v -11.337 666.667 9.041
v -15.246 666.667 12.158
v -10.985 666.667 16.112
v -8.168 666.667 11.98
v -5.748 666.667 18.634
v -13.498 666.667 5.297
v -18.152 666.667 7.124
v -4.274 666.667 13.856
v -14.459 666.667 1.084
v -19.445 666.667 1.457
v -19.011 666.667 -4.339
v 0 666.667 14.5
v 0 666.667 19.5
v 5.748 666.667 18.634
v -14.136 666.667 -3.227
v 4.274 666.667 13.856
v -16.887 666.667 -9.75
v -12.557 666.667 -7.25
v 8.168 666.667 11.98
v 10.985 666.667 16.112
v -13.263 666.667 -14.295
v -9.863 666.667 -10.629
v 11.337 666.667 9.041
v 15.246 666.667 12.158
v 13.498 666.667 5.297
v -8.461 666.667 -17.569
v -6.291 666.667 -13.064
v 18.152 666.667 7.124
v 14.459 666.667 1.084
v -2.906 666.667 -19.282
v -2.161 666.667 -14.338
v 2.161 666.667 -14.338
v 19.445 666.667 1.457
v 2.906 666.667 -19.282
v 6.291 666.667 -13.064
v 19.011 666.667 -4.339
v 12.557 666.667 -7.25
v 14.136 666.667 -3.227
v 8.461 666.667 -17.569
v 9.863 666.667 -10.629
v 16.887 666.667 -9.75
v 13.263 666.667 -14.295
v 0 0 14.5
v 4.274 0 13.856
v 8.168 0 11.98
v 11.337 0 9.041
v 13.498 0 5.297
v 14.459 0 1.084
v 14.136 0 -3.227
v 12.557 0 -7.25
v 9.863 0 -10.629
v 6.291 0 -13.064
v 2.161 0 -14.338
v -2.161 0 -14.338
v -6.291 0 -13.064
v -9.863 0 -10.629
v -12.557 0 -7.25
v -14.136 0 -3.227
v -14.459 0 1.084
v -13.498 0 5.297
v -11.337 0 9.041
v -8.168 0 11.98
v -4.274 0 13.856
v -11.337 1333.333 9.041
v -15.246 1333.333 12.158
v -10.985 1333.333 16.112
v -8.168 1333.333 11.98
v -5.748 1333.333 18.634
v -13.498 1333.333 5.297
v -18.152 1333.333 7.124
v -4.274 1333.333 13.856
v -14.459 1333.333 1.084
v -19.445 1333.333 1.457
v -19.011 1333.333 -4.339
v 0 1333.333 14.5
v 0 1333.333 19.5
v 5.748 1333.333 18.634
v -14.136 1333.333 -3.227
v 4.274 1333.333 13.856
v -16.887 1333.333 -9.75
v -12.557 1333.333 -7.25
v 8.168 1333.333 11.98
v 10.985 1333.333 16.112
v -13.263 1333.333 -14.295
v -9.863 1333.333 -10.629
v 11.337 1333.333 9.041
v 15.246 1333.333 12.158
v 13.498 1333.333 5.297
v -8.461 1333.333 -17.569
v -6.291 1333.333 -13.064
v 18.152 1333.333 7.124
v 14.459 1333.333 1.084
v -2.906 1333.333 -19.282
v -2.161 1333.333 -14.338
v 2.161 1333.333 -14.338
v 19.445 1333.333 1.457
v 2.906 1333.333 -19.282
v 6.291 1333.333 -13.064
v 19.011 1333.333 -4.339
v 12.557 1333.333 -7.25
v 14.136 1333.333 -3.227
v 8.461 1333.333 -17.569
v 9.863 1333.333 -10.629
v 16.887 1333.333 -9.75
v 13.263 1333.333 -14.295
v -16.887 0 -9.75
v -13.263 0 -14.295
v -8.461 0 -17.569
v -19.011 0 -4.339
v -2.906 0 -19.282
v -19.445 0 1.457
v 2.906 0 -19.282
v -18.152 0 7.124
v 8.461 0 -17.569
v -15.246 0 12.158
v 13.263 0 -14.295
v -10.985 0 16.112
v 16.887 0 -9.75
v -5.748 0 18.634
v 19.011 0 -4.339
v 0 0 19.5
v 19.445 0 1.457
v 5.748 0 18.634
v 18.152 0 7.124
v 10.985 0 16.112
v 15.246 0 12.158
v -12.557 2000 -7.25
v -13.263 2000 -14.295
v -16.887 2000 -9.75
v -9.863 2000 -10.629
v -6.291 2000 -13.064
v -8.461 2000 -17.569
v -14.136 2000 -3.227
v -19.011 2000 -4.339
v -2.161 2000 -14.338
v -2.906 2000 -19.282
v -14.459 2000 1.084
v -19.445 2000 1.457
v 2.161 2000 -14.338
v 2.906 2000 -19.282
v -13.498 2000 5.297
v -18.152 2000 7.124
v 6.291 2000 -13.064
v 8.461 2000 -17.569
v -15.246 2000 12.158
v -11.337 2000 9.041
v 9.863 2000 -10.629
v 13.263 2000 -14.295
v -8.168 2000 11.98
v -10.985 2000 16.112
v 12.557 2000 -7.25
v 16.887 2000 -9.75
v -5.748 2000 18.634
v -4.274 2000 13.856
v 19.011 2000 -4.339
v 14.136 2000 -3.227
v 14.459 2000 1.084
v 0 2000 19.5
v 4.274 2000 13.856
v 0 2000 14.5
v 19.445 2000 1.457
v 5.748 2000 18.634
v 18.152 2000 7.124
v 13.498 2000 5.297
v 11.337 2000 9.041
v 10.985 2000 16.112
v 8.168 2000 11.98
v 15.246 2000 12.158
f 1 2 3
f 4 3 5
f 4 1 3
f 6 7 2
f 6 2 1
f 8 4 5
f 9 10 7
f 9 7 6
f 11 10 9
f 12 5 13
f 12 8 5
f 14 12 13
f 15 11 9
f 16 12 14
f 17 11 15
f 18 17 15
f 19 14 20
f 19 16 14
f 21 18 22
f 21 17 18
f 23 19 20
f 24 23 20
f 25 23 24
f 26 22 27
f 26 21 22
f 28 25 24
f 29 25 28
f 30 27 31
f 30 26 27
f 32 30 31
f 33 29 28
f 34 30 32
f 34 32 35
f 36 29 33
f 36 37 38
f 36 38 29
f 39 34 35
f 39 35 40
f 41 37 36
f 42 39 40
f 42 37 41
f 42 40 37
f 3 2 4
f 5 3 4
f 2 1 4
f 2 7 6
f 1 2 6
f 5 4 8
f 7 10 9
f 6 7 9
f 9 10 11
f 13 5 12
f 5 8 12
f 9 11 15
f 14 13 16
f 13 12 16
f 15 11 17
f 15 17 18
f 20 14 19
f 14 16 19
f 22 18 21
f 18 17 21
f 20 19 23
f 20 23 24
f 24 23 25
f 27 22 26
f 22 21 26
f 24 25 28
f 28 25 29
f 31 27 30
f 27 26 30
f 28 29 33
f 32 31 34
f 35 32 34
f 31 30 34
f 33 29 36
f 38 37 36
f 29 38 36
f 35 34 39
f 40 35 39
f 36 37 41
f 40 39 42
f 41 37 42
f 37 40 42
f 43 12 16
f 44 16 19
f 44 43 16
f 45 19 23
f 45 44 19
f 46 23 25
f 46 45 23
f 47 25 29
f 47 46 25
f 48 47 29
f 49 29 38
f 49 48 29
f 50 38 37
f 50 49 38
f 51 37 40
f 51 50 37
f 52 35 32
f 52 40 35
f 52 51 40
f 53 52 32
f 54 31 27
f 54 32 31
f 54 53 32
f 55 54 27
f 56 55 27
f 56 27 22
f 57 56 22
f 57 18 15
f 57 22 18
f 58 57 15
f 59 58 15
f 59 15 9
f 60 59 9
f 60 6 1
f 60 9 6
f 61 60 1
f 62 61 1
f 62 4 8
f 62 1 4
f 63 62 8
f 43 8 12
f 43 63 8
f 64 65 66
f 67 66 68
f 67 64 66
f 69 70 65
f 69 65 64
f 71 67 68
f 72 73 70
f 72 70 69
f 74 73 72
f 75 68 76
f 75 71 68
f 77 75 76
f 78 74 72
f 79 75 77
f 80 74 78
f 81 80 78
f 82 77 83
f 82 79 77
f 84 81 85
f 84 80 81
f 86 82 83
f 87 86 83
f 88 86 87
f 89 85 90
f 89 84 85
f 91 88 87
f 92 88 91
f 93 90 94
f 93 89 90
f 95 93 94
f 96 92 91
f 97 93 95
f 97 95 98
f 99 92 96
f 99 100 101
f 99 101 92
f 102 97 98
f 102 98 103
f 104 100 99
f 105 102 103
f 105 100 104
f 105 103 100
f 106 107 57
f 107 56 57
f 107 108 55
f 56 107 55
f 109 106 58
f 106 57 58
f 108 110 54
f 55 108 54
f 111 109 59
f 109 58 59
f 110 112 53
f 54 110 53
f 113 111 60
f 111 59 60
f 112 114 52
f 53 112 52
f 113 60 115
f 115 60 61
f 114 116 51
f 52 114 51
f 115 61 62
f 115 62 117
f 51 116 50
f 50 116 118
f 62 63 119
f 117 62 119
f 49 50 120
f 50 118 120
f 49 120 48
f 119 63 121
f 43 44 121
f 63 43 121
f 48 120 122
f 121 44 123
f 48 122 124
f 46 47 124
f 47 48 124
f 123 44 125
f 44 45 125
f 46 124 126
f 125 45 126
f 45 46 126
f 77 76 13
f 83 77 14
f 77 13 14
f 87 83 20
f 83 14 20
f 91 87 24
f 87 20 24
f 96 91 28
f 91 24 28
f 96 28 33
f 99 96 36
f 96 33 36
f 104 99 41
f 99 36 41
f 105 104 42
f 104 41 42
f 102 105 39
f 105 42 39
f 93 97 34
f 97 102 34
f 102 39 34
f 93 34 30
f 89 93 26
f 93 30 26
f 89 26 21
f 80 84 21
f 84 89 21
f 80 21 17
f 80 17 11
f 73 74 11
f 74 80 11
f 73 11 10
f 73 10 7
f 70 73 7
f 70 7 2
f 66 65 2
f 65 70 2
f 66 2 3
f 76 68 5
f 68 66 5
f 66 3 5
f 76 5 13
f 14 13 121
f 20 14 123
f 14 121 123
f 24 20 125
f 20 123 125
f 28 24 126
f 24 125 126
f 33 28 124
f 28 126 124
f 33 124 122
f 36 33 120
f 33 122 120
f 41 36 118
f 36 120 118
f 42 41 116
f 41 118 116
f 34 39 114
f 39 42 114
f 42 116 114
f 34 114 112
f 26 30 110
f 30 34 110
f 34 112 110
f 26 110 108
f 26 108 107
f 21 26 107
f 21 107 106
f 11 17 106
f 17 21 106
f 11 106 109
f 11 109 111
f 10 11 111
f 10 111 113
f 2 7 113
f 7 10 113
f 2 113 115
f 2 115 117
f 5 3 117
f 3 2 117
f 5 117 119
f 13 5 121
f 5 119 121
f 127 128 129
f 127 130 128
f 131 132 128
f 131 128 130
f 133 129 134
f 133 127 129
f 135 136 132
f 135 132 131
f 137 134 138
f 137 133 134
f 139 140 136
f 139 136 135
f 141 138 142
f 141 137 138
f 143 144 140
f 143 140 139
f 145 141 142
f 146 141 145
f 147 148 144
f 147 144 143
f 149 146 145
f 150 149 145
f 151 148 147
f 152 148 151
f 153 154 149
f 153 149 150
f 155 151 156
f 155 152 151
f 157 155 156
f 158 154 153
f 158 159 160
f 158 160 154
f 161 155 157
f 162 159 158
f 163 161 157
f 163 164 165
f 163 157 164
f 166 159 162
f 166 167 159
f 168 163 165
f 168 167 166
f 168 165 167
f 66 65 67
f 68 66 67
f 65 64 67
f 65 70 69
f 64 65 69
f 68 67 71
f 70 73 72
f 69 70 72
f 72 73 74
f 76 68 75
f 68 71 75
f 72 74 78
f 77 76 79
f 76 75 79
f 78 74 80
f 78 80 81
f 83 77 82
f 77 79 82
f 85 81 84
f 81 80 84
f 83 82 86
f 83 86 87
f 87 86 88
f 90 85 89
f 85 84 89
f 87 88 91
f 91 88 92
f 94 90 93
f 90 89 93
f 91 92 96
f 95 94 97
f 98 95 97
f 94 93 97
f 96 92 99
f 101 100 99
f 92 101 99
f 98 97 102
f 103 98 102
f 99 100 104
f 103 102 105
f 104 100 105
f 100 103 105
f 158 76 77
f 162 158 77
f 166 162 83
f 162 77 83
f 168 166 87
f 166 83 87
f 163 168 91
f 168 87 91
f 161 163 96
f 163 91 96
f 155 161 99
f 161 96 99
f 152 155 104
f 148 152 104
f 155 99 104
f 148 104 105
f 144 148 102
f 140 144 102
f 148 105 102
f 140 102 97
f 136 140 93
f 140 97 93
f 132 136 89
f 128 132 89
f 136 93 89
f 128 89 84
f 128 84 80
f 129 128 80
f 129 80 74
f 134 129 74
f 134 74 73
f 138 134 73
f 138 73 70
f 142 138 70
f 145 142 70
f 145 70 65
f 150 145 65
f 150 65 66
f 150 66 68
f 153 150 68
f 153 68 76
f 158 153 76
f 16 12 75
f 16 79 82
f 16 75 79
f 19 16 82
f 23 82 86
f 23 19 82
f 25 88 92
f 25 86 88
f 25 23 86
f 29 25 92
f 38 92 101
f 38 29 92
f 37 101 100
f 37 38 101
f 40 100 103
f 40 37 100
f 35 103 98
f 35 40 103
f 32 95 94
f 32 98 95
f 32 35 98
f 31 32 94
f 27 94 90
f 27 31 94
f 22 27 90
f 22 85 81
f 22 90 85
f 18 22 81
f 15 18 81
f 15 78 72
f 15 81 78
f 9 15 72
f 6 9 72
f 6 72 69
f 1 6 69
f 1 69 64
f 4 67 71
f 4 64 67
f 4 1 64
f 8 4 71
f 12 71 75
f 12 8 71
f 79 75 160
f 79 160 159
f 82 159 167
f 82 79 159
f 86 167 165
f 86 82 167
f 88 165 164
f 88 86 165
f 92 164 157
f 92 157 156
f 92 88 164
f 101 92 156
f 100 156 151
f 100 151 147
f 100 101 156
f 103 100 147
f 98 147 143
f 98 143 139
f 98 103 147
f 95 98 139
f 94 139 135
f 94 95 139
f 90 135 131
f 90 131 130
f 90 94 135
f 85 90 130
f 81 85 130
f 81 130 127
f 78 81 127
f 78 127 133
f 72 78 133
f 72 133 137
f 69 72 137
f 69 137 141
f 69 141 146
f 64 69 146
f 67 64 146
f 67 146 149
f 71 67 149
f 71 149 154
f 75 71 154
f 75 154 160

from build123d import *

# Parameters (mm, degrees)
SKETCH1_R                = 19.5
SKETCH1_R_2              = 14.5
BOSS_EXTRUDE1_DEPTH      = 2000
SPLIT1_SURFACE_1_1_BACK  = 2001.76
SPLIT1_SURFACE_1_1_DEPTH = 4003.52
SPLIT1_SURFACE_1_2_BACK  = 2001.76
SPLIT1_SURFACE_1_2_DEPTH = 4003.52
SPLIT1_SURFACE_2_3_BACK  = 2001.76
SPLIT1_SURFACE_2_3_DEPTH = 4003.52
SPLIT1_SURFACE_2_4_BACK  = 2001.76
SPLIT1_SURFACE_2_4_DEPTH = 4003.52


with BuildPart() as part:
    # Sketch1 → Boss-Extrude1 (new body)
    with BuildSketch(Plane(origin=(0, 0, 0), x_dir=(1, 0, 0), z_dir=(0, 1, 0))):
        with Locations(Location((0, 0, 0), (0, 0, 270))):
            Circle(SKETCH1_R)
        with Locations(Location((0, 0, 0), (0, 0, 270))):
            Circle(SKETCH1_R_2, mode=Mode.SUBTRACT)
    extrude(amount=BOSS_EXTRUDE1_DEPTH)


with BuildPart() as body_2:
    # Split1: the piece behind the surface
    add(part.part)
    # Split1 surface 1: a surface, the sketch's curves swept straight by 4003.52 mm
    with BuildLine(Plane.XY.offset(-SPLIT1_SURFACE_1_1_BACK), mode=Mode.PRIVATE) as split1_surface_1_1_path:
        Line((-19.5, 1333.333333333), (19.5, 1333.333333333))
    split1_surface_1_1 = Shell.extrude(split1_surface_1_1_path.wire(), (0 * SPLIT1_SURFACE_1_1_DEPTH, 0 * SPLIT1_SURFACE_1_1_DEPTH, 1 * SPLIT1_SURFACE_1_1_DEPTH))
    split(bisect_by=split1_surface_1_1, keep=Keep.BOTTOM)


with BuildPart() as part_1:
    add(part.part)

    # Split1: split by a surface, the side it looks to stays
    # Split1 surface 1: a surface, the sketch's curves swept straight by 4003.52 mm
    with BuildLine(Plane.XY.offset(-SPLIT1_SURFACE_1_2_BACK), mode=Mode.PRIVATE) as split1_surface_1_2_path:
        Line((-19.5, 1333.333333333), (19.5, 1333.333333333))
    split1_surface_1_2 = Shell.extrude(split1_surface_1_2_path.wire(), (0 * SPLIT1_SURFACE_1_2_DEPTH, 0 * SPLIT1_SURFACE_1_2_DEPTH, 1 * SPLIT1_SURFACE_1_2_DEPTH))
    split(bisect_by=split1_surface_1_2, keep=Keep.TOP)


with BuildPart() as body_3:
    # Split1 2 body 2: the piece behind the surface
    add(body_2.part)
    # Split1 surface 2: a surface, the sketch's curves swept straight by 4003.52 mm
    with BuildLine(Plane.XY.offset(-SPLIT1_SURFACE_2_3_BACK), mode=Mode.PRIVATE) as split1_surface_2_3_path:
        Line((-19.5, 666.666666667), (19.5, 666.666666667))
    split1_surface_2_3 = Shell.extrude(split1_surface_2_3_path.wire(), (0 * SPLIT1_SURFACE_2_3_DEPTH, 0 * SPLIT1_SURFACE_2_3_DEPTH, 1 * SPLIT1_SURFACE_2_3_DEPTH))
    split(bisect_by=split1_surface_2_3, keep=Keep.BOTTOM)


with BuildPart() as body_2_1:
    add(body_2.part)

    # Split1 2 body 2: split by a surface, the side it looks to stays
    # Split1 surface 2: a surface, the sketch's curves swept straight by 4003.52 mm
    with BuildLine(Plane.XY.offset(-SPLIT1_SURFACE_2_4_BACK), mode=Mode.PRIVATE) as split1_surface_2_4_path:
        Line((-19.5, 666.666666667), (19.5, 666.666666667))
    split1_surface_2_4 = Shell.extrude(split1_surface_2_4_path.wire(), (0 * SPLIT1_SURFACE_2_4_DEPTH, 0 * SPLIT1_SURFACE_2_4_DEPTH, 1 * SPLIT1_SURFACE_2_4_DEPTH))
    split(bisect_by=split1_surface_2_4, keep=Keep.TOP)


solid = Compound([part_1.part, body_3.part, body_2_1.part])
